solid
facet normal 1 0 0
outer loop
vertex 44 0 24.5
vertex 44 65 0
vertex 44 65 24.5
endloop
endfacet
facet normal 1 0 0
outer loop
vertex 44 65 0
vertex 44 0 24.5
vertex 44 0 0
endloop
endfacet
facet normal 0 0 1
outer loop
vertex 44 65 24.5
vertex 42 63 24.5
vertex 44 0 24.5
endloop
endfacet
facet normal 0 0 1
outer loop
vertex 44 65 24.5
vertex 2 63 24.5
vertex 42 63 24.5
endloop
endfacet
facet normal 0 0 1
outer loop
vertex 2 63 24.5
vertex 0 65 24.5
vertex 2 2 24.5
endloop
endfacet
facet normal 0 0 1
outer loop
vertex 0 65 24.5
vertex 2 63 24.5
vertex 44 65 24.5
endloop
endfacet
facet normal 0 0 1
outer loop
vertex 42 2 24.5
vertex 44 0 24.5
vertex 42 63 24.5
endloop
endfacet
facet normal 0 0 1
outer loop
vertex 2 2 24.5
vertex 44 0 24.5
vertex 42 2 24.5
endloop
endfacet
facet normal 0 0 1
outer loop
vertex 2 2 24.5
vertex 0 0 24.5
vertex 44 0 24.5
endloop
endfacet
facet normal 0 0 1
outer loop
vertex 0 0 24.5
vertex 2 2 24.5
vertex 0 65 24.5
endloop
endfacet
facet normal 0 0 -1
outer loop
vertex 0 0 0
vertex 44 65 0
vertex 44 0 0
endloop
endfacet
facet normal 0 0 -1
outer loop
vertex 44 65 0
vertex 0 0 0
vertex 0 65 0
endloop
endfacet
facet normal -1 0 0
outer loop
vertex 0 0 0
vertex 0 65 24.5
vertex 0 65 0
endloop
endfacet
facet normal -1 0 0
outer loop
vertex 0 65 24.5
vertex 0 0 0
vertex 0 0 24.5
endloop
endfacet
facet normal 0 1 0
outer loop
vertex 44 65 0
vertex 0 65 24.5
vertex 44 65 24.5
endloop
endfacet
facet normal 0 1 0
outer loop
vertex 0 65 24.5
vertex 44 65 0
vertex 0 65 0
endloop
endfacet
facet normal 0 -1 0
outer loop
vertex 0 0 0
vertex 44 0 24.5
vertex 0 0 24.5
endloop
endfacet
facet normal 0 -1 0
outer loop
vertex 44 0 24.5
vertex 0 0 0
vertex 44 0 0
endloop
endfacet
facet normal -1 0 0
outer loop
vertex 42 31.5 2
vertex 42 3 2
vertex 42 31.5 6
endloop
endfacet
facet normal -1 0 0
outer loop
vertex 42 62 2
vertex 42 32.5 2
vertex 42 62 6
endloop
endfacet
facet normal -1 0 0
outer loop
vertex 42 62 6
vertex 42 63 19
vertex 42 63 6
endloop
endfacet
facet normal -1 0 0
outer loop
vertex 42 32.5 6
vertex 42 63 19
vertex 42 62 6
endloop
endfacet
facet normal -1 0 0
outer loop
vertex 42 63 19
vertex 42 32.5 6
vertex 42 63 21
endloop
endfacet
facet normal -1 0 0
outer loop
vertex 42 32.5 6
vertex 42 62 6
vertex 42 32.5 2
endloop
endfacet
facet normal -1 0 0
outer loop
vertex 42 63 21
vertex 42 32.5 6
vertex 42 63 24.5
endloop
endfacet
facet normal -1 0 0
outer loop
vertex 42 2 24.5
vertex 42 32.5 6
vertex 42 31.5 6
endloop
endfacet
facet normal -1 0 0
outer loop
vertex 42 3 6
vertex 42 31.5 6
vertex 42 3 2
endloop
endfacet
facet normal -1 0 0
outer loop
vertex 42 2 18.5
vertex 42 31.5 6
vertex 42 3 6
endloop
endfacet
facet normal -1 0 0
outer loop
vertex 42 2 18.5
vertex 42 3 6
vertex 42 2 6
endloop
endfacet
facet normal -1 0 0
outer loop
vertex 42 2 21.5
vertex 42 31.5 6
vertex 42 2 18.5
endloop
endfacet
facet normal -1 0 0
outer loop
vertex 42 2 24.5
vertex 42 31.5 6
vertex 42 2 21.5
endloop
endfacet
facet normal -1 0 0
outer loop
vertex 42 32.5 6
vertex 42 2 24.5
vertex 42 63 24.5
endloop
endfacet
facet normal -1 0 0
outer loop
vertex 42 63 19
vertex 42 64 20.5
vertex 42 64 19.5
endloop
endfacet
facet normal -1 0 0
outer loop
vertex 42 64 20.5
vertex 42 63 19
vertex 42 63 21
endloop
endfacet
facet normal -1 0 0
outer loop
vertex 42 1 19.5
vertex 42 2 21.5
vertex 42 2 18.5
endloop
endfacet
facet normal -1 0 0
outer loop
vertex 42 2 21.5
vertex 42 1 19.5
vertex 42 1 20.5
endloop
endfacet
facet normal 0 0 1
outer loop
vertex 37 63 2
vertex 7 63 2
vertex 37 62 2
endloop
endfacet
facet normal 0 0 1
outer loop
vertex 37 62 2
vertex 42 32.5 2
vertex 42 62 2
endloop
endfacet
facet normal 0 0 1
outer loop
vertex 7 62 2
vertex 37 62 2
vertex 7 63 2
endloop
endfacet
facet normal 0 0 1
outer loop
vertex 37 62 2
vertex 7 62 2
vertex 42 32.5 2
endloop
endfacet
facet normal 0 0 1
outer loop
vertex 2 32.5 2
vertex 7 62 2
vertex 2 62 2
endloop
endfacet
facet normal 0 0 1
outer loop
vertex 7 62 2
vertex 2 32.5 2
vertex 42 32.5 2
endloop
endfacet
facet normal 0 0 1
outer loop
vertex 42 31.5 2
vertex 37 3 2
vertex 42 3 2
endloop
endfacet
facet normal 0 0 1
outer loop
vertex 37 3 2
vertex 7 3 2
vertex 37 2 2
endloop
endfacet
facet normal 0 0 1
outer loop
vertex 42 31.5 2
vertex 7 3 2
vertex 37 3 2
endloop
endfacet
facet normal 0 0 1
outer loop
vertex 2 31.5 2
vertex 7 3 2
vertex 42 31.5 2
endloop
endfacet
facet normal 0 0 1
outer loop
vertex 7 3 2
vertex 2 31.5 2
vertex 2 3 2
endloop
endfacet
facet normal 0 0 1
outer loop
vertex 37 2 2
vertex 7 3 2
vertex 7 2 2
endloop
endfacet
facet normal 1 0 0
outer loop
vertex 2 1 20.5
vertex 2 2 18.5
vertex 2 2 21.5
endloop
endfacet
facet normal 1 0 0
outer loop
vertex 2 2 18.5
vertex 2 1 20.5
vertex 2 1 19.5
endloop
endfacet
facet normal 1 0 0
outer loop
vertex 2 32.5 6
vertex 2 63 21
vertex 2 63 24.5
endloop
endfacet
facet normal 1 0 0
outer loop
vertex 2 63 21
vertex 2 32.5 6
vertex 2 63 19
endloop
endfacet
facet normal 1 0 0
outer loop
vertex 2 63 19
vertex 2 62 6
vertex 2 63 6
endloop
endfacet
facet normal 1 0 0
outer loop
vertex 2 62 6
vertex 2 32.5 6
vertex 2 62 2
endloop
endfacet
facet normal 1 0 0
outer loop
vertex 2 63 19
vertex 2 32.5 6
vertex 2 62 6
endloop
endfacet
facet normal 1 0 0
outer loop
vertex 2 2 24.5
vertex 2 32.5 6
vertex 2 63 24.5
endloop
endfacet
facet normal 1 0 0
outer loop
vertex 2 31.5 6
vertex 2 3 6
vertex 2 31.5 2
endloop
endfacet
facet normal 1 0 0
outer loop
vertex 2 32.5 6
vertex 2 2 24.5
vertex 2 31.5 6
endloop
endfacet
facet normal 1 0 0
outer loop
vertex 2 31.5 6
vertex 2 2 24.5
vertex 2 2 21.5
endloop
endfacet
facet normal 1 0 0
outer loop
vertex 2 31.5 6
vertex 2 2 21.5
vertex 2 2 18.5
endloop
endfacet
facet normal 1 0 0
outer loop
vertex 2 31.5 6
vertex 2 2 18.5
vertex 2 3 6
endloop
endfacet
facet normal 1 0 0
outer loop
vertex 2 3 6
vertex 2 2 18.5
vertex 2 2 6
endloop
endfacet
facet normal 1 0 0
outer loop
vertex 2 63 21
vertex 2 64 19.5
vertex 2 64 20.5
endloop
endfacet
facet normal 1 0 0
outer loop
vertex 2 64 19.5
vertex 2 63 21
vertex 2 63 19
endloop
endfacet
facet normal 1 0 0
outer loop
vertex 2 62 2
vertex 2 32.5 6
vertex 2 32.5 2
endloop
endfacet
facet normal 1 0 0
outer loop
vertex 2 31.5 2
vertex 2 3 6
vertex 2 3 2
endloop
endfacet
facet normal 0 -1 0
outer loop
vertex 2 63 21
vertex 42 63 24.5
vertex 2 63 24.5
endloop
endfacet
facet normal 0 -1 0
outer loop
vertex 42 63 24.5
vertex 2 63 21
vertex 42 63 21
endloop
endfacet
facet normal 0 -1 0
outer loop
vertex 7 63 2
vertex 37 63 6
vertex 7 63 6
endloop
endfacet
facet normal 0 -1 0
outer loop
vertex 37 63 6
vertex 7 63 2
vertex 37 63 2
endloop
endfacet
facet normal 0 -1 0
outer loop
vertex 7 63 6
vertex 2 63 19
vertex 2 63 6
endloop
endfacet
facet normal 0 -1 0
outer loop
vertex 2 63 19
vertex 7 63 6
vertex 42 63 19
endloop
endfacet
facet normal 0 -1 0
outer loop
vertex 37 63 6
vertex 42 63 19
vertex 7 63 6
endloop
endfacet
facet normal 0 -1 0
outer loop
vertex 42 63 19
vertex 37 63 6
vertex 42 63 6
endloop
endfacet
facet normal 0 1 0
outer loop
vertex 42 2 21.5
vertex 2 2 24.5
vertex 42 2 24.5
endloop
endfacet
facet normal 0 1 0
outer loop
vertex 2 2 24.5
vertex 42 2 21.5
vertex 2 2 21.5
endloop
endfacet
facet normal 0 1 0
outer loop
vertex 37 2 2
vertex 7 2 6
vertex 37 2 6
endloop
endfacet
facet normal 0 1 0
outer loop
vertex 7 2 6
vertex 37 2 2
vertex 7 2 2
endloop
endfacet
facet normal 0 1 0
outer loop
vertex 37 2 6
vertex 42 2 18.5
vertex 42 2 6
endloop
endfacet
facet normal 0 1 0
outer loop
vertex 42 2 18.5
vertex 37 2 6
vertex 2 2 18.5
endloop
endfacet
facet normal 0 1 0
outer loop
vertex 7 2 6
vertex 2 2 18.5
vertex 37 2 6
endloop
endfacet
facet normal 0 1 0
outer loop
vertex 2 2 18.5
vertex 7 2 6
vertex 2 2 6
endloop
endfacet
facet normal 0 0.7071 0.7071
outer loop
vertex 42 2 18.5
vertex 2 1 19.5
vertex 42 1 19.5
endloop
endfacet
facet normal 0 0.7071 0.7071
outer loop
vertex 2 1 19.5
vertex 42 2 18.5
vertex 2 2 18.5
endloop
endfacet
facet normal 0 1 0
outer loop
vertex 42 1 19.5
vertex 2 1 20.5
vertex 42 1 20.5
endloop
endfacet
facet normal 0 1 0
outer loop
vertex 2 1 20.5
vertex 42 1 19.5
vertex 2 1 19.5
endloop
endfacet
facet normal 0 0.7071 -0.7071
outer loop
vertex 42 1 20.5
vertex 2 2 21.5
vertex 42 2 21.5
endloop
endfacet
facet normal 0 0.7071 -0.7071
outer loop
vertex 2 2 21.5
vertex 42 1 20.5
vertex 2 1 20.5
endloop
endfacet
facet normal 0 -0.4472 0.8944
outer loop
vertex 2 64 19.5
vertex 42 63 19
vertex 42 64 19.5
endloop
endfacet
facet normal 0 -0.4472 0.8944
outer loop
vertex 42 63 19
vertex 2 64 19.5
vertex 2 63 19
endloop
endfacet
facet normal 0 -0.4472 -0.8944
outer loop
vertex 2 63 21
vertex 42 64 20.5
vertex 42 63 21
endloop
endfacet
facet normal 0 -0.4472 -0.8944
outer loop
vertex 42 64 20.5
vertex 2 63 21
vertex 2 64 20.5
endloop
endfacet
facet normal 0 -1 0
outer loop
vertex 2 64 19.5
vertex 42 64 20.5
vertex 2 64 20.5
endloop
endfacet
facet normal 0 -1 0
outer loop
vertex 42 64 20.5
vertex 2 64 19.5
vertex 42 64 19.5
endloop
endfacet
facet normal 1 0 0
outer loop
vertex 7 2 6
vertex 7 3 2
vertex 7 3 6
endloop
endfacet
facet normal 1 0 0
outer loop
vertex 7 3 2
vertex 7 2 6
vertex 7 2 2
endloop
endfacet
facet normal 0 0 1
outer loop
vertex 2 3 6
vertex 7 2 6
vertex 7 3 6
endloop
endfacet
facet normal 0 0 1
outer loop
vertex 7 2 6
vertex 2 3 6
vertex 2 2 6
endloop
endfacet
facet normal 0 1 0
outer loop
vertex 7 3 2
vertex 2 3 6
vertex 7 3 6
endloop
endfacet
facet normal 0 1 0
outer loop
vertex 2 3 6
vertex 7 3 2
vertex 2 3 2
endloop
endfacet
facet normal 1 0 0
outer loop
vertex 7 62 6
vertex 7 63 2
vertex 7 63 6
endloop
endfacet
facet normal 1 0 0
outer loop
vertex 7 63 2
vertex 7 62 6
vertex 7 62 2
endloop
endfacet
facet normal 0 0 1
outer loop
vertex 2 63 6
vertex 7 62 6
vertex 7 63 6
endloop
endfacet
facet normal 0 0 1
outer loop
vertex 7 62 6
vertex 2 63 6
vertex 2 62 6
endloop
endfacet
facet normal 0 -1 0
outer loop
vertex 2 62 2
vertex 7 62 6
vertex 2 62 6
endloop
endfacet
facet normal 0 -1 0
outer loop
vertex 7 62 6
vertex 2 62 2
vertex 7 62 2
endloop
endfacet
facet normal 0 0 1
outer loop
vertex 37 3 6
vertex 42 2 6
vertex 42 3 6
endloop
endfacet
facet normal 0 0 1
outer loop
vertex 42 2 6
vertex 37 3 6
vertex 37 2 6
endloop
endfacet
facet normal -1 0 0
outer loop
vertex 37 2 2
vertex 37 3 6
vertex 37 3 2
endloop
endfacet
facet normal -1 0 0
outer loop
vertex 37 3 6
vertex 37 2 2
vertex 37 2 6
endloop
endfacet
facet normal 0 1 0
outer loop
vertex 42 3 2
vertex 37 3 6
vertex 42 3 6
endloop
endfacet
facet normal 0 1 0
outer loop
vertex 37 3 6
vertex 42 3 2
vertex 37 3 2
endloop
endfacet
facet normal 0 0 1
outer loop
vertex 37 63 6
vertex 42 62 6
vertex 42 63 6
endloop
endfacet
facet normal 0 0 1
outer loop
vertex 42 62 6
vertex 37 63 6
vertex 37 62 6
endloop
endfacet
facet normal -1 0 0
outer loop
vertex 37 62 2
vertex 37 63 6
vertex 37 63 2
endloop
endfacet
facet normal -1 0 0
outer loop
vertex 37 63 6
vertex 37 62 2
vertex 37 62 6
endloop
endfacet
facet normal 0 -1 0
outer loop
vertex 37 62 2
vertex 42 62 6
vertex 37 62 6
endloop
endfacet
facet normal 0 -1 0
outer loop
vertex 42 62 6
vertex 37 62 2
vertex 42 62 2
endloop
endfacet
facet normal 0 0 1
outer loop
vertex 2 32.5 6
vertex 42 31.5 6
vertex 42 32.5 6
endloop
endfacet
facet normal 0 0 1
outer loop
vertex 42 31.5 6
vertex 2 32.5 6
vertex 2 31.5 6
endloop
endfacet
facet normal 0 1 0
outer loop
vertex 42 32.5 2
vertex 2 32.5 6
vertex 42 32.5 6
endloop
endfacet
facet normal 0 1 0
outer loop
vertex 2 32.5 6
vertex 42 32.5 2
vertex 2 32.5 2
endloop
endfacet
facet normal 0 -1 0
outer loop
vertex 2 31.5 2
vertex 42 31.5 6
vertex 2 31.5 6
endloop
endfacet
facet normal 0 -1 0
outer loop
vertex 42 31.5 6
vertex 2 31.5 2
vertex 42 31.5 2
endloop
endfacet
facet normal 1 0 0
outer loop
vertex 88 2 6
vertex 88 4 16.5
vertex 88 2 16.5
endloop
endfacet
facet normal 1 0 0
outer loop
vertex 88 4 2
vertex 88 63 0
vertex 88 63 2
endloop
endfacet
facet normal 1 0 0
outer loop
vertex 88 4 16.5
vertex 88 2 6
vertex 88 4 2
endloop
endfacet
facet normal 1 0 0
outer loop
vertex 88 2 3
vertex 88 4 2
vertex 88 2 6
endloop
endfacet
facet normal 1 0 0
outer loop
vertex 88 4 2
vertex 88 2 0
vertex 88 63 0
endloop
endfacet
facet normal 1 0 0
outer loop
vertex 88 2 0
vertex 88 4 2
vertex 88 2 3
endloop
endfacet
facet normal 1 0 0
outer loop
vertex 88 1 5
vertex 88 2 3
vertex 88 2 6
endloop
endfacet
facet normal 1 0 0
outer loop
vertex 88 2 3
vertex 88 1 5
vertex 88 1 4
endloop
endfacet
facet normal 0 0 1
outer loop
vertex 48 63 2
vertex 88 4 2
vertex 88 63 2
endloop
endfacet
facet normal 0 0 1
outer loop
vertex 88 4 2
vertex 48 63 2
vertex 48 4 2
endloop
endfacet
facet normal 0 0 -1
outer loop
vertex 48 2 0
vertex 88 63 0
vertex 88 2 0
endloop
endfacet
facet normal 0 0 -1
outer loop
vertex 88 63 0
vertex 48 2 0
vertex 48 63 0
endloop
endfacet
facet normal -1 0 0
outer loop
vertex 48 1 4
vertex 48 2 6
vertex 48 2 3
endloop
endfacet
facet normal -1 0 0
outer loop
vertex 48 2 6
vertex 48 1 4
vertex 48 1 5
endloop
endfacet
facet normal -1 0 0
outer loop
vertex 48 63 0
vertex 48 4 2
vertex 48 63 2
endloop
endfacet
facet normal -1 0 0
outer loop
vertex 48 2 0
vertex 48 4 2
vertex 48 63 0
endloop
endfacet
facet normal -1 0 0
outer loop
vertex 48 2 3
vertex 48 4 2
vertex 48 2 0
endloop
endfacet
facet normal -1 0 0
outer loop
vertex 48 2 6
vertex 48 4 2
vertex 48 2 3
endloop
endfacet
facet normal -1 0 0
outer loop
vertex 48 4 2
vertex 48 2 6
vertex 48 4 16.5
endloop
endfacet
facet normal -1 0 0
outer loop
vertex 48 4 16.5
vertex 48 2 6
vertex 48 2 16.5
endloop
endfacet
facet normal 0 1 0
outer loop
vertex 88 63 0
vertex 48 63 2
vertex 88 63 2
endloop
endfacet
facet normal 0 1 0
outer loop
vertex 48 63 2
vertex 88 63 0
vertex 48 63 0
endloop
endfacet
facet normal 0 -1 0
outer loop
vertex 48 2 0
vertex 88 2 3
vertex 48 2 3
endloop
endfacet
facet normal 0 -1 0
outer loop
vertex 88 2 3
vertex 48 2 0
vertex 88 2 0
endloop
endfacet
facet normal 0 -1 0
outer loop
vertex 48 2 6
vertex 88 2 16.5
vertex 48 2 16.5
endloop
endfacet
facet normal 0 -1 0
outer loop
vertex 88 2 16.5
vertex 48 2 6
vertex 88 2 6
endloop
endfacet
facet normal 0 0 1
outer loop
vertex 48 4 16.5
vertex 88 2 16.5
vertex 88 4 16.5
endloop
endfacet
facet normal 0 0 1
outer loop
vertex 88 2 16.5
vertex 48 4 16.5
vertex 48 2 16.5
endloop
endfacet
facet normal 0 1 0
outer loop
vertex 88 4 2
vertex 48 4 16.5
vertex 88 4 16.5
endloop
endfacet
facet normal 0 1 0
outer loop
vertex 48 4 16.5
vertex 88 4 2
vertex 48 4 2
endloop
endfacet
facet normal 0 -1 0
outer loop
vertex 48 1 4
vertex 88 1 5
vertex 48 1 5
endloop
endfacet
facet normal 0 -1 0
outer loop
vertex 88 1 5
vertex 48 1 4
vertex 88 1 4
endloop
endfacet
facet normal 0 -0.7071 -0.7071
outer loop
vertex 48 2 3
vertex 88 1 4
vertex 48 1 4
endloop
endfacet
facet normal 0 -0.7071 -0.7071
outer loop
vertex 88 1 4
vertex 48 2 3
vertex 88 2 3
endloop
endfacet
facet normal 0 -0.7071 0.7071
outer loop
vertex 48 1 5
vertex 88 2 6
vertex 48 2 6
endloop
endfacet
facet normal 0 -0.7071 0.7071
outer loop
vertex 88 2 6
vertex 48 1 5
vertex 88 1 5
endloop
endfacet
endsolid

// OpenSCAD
// Box for SOlar System Min Reader

rw=40;   // RC522 PCB width
rh=60;   // RC522 PCB height
rt=4;   // RC522 component thickness
bw=28;  // Daughter board width
t=1.5;  // Board thicknesses
bh=36;  // Daughter board height
by=1;   // Daughter board offset over edge of RC522
bz=5;   // Daughter board offset from RC522
bx=(rw-bw)/2; // Daughter board offset x
st=10;  // Screw thickness
w=2;    // Wall thickness
cx=5;   // Coner support
cy=1;   // Corner support
clip=1;    // clip size

module lid()
{
    difference()
    {
        cube([rw+w*2,rh+w*2+by,rt+bz+t+st+w*2]);
        translate([w,w,w])
        cube([rw,rh+by,rt+bz+t+st+w*2]);
        hull()
        {
            translate([w,w,rt+bz+t+st+w*2-clip*4-w])
            cube([rw,clip,clip*3]);
            translate([w,w-clip,rt+bz+t+st+w*2-clip*3-w])
            cube([rw,clip,clip]);
        }
        hull()
        {
            translate([w,rh+w*2+by-w*2,rt+bz+t+st+w*2-clip*4-w])
            cube([rw,clip,clip*3]);
            translate([w,rh+w*2+by-w,rt+bz+t+st+w*2-clip*3-w])
            cube([rw,clip,clip]);
        }
    }
    for(x=[0,w*2+rw-cx-w])
        for(y=[0,w*w+rh+by-cy-w])
        translate([x,y,0])
        cube([w+cx,w+cy,w+rt]);
    translate([0,w+rh/2-cy/2,0])
        cube([w*2+rw,cy,w+rt]);
}

module base()
{
    difference()
    {
        translate([w,w,0])
        {
            cube([rw,rh+by,w]);
            cube([rw,w,bz+t+st]);
        }
        // Screw holes in back

        // Cable hole
        
    }
    // screw posts

    // End
    hull()
    {
        translate([w,w,w+clip])
        cube([rw,w,clip*3]);
        translate([w,w-clip,w+clip*2])
        cube([rw,clip,clip]);
    }
}


lid();
translate([rw+w*3,0,0])
base();
